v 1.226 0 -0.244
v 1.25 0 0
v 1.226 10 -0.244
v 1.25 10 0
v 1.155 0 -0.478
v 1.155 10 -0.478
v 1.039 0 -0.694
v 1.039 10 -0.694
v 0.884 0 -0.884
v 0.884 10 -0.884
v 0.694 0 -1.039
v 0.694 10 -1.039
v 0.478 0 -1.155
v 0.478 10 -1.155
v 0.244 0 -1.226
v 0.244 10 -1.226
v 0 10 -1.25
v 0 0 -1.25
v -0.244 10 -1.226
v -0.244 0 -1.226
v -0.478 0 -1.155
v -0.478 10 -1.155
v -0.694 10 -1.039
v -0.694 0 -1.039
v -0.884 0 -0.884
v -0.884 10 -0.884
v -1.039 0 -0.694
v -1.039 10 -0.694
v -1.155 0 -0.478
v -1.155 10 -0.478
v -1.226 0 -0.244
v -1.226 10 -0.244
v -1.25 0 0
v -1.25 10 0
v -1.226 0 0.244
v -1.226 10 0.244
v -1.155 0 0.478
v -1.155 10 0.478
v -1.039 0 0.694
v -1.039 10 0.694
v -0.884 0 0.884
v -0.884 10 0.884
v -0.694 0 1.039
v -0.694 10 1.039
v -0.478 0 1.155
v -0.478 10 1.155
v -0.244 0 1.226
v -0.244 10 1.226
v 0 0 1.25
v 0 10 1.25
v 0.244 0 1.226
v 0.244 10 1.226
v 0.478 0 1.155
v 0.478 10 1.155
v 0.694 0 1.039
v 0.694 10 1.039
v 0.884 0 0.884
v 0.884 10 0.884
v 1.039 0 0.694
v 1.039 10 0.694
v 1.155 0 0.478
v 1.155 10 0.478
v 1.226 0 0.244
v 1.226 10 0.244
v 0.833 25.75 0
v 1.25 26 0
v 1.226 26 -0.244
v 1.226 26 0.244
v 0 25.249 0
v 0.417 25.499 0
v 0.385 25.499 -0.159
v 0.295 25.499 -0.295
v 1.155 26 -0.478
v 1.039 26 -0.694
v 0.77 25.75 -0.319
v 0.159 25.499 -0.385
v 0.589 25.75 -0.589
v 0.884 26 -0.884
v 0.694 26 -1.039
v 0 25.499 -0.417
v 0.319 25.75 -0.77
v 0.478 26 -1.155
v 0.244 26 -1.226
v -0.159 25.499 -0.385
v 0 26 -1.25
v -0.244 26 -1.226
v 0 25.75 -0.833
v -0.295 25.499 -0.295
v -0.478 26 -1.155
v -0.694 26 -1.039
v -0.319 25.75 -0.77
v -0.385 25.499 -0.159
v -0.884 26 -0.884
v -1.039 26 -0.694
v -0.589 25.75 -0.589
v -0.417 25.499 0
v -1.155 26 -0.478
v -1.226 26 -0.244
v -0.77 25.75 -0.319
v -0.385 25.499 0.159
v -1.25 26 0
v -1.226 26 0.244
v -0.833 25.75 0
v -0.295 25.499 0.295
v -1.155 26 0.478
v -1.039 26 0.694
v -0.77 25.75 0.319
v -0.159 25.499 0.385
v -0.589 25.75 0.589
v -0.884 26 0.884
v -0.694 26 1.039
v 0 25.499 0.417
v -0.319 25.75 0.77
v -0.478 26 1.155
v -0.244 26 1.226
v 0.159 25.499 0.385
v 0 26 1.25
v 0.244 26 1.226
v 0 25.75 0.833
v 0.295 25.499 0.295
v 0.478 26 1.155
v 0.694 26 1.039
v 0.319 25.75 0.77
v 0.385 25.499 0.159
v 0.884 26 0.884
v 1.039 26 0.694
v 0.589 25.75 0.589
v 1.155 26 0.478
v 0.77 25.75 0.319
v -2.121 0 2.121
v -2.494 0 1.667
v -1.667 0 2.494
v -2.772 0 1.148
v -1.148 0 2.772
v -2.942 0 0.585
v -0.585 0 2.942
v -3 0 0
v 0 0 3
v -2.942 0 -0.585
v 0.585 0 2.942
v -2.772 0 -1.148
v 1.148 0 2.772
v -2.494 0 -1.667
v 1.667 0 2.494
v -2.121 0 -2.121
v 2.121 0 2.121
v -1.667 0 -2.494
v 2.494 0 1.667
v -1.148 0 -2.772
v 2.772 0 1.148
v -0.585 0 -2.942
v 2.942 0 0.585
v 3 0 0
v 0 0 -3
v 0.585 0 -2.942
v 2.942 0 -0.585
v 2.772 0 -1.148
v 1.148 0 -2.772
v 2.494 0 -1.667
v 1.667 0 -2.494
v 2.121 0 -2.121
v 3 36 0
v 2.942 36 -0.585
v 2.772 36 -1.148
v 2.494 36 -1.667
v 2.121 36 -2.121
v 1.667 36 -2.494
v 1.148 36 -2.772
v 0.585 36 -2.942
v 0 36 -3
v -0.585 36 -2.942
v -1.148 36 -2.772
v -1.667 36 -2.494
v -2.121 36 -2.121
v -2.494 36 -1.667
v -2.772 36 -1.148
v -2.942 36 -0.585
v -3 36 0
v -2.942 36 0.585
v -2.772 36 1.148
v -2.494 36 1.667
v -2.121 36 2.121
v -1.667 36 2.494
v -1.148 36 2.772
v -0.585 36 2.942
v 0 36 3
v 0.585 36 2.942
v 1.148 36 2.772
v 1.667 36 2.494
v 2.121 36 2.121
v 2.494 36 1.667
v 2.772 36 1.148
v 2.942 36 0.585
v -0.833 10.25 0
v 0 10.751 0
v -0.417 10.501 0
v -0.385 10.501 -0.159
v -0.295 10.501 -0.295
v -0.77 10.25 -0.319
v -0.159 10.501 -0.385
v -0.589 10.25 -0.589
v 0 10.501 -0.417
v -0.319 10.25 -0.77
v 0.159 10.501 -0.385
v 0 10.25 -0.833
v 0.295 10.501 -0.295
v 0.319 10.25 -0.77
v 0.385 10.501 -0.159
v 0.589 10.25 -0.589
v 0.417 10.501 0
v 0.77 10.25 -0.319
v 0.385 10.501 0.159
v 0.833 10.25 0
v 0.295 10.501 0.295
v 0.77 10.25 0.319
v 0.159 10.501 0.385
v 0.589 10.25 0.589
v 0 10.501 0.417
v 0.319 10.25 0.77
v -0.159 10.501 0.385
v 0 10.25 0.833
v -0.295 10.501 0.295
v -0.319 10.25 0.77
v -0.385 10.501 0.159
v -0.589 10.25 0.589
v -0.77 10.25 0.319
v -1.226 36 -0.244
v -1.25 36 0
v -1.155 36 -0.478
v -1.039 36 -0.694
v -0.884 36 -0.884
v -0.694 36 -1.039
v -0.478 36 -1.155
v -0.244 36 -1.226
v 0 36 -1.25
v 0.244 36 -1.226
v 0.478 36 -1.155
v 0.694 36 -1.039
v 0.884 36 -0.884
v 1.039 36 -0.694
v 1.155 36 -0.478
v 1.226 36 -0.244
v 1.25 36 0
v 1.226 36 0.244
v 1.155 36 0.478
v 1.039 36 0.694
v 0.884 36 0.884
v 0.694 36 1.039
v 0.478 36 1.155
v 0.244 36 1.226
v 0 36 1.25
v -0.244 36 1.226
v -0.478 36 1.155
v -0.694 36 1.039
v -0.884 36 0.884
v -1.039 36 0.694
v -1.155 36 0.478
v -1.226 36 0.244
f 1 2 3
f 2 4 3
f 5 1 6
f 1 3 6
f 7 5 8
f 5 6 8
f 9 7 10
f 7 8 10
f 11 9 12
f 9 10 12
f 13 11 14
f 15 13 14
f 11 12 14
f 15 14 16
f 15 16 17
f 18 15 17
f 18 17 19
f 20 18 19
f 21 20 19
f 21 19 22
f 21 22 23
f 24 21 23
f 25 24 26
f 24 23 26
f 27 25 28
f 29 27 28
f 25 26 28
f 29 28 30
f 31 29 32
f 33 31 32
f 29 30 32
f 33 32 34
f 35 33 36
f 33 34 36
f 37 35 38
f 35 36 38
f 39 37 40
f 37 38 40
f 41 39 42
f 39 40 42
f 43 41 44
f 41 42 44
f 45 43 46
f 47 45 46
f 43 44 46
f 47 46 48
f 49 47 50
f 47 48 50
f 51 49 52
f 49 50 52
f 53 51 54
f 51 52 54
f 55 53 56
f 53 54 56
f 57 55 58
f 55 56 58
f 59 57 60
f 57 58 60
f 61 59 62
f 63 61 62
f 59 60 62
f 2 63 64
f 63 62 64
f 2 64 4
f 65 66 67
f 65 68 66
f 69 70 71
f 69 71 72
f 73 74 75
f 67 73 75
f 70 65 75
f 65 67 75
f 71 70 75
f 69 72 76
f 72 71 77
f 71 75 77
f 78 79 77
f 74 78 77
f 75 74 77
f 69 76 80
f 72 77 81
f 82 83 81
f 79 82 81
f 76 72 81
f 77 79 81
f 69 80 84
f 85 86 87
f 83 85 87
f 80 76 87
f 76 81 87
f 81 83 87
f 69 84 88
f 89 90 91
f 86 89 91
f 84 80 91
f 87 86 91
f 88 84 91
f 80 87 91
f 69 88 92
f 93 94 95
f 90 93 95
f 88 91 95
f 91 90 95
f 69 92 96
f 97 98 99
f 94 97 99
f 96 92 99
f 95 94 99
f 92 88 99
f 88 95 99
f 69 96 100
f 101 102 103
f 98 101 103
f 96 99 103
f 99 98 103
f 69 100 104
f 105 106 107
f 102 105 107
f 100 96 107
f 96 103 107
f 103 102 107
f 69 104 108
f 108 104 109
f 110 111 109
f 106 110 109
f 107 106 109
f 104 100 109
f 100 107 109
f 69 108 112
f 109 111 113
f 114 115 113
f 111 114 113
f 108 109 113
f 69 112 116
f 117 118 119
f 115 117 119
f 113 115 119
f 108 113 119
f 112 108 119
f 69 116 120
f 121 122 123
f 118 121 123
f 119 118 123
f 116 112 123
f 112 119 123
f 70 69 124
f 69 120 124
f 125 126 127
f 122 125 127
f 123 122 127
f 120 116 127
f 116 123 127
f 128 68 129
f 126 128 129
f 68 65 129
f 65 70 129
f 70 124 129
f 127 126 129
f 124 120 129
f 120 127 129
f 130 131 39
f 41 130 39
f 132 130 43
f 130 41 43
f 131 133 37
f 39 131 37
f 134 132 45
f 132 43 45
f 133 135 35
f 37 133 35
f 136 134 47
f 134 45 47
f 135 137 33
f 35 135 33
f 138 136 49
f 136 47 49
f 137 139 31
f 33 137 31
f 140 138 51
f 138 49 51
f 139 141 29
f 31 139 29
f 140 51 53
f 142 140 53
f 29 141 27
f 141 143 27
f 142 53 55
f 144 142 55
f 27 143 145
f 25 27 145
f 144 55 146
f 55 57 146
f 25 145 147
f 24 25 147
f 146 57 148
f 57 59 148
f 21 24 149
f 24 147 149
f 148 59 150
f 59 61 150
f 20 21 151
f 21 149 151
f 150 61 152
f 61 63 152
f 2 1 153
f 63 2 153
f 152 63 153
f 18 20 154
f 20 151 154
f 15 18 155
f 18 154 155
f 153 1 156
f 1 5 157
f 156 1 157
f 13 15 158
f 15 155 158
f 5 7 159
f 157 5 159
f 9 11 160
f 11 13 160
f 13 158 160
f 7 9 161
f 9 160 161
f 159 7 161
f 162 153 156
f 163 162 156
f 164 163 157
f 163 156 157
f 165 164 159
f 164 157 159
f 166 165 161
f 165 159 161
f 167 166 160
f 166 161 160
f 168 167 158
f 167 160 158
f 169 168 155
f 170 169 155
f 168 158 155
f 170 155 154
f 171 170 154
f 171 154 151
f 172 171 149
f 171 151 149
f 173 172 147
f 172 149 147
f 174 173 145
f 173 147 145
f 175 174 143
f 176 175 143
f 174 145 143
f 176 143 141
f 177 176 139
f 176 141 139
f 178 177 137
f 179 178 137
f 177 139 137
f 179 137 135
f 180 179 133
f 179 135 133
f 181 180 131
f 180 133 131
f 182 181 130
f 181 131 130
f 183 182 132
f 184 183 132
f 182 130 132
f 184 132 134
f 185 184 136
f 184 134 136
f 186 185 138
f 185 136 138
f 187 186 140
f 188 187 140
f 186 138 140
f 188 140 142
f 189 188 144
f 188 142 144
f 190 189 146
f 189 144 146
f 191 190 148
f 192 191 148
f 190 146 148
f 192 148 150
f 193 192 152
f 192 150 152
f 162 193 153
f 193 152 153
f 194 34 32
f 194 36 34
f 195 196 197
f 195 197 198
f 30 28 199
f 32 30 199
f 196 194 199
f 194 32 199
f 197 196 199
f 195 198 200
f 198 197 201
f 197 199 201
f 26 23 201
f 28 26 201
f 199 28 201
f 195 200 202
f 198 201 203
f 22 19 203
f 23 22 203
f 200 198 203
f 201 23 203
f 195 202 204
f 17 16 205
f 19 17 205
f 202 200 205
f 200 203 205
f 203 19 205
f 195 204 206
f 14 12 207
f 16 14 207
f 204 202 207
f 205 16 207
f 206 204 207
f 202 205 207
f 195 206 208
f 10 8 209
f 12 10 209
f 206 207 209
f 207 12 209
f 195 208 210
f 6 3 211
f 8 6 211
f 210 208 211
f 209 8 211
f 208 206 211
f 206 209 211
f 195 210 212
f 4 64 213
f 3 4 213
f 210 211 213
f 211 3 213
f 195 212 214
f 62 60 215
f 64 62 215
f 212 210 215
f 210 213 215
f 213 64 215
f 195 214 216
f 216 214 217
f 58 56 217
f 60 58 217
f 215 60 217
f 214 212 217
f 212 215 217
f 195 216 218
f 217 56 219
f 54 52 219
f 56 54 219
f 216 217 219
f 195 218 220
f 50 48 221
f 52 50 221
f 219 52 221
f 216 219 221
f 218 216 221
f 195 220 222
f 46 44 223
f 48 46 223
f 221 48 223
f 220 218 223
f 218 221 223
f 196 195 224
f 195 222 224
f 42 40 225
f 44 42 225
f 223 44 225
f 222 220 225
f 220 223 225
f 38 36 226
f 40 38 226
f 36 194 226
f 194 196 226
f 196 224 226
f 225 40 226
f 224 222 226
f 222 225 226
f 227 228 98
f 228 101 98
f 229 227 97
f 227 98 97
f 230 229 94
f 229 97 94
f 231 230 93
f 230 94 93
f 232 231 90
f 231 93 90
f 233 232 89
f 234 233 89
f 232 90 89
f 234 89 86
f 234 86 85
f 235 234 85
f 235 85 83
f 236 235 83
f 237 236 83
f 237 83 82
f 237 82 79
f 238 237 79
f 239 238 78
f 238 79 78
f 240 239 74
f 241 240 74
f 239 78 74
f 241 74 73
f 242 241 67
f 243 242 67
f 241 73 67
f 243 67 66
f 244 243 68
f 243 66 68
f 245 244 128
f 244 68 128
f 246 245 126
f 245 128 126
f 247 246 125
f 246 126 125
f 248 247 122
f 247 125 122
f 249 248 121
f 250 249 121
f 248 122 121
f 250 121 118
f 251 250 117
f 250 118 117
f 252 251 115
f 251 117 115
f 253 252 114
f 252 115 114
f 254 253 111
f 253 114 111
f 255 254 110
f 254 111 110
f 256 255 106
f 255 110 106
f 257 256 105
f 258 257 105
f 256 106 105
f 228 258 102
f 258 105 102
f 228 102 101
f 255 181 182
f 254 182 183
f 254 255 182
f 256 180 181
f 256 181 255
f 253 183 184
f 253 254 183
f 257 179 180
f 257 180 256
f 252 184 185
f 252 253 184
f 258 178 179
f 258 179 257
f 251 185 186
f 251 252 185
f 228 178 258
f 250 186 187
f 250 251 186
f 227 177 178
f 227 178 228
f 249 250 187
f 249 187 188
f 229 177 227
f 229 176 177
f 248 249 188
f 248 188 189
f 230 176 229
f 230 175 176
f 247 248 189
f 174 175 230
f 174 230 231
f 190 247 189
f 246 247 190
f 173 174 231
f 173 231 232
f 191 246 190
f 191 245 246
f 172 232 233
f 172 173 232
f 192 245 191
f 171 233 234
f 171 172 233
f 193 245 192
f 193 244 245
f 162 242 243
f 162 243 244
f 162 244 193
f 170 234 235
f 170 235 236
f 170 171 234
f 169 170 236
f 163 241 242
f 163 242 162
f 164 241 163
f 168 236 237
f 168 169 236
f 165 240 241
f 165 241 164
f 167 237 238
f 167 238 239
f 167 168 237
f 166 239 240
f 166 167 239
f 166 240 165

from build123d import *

# Parameters (mm, degrees)
SKETCH1_R                   = 3
BOSS_EXTRUDE1_DEPTH         = 36
TAP_DRILL_FOR_M3_TAP1_D     = 2.5
TAP_DRILL_FOR_M3_TAP1_DEPTH = 10
TAP_DRILL_FOR_M3_TAP1_TIP   = 0.751075774
TAP_DRILL_FOR_M3_TAP2_D     = 2.5
TAP_DRILL_FOR_M3_TAP2_DEPTH = 10
TAP_DRILL_FOR_M3_TAP2_TIP   = 0.751075774


with BuildPart() as part:
    # Sketch1 → Boss-Extrude1 (new body)
    with BuildSketch(Plane(origin=(0, 0, 0), x_dir=(1, 0, 0), z_dir=(0, 1, 0))):
        Circle(SKETCH1_R)
    extrude(amount=BOSS_EXTRUDE1_DEPTH)

    # Tap Drill for M3 Tap1
    with Locations(Plane(origin=(0, 36, 0), x_dir=(1, 0, 0), z_dir=(0, 1, 0))):
        with Locations((0, 0)):
            Hole(TAP_DRILL_FOR_M3_TAP1_D / 2, depth=TAP_DRILL_FOR_M3_TAP1_DEPTH)
            with Locations((0, 0, -(TAP_DRILL_FOR_M3_TAP1_DEPTH + TAP_DRILL_FOR_M3_TAP1_TIP / 2))):  # 118° drill point
                Cone(0, TAP_DRILL_FOR_M3_TAP1_D / 2, TAP_DRILL_FOR_M3_TAP1_TIP, mode=Mode.SUBTRACT)

    # Tap Drill for M3 Tap2
    with Locations(Plane(origin=(0, 0, 0), x_dir=(-1, 0, 0), z_dir=(0, -1, 0))):
        with Locations((0, 0)):
            Hole(TAP_DRILL_FOR_M3_TAP2_D / 2, depth=TAP_DRILL_FOR_M3_TAP2_DEPTH)
            with Locations((0, 0, -(TAP_DRILL_FOR_M3_TAP2_DEPTH + TAP_DRILL_FOR_M3_TAP2_TIP / 2))):  # 118° drill point
                Cone(0, TAP_DRILL_FOR_M3_TAP2_D / 2, TAP_DRILL_FOR_M3_TAP2_TIP, mode=Mode.SUBTRACT)


solid = part.part
